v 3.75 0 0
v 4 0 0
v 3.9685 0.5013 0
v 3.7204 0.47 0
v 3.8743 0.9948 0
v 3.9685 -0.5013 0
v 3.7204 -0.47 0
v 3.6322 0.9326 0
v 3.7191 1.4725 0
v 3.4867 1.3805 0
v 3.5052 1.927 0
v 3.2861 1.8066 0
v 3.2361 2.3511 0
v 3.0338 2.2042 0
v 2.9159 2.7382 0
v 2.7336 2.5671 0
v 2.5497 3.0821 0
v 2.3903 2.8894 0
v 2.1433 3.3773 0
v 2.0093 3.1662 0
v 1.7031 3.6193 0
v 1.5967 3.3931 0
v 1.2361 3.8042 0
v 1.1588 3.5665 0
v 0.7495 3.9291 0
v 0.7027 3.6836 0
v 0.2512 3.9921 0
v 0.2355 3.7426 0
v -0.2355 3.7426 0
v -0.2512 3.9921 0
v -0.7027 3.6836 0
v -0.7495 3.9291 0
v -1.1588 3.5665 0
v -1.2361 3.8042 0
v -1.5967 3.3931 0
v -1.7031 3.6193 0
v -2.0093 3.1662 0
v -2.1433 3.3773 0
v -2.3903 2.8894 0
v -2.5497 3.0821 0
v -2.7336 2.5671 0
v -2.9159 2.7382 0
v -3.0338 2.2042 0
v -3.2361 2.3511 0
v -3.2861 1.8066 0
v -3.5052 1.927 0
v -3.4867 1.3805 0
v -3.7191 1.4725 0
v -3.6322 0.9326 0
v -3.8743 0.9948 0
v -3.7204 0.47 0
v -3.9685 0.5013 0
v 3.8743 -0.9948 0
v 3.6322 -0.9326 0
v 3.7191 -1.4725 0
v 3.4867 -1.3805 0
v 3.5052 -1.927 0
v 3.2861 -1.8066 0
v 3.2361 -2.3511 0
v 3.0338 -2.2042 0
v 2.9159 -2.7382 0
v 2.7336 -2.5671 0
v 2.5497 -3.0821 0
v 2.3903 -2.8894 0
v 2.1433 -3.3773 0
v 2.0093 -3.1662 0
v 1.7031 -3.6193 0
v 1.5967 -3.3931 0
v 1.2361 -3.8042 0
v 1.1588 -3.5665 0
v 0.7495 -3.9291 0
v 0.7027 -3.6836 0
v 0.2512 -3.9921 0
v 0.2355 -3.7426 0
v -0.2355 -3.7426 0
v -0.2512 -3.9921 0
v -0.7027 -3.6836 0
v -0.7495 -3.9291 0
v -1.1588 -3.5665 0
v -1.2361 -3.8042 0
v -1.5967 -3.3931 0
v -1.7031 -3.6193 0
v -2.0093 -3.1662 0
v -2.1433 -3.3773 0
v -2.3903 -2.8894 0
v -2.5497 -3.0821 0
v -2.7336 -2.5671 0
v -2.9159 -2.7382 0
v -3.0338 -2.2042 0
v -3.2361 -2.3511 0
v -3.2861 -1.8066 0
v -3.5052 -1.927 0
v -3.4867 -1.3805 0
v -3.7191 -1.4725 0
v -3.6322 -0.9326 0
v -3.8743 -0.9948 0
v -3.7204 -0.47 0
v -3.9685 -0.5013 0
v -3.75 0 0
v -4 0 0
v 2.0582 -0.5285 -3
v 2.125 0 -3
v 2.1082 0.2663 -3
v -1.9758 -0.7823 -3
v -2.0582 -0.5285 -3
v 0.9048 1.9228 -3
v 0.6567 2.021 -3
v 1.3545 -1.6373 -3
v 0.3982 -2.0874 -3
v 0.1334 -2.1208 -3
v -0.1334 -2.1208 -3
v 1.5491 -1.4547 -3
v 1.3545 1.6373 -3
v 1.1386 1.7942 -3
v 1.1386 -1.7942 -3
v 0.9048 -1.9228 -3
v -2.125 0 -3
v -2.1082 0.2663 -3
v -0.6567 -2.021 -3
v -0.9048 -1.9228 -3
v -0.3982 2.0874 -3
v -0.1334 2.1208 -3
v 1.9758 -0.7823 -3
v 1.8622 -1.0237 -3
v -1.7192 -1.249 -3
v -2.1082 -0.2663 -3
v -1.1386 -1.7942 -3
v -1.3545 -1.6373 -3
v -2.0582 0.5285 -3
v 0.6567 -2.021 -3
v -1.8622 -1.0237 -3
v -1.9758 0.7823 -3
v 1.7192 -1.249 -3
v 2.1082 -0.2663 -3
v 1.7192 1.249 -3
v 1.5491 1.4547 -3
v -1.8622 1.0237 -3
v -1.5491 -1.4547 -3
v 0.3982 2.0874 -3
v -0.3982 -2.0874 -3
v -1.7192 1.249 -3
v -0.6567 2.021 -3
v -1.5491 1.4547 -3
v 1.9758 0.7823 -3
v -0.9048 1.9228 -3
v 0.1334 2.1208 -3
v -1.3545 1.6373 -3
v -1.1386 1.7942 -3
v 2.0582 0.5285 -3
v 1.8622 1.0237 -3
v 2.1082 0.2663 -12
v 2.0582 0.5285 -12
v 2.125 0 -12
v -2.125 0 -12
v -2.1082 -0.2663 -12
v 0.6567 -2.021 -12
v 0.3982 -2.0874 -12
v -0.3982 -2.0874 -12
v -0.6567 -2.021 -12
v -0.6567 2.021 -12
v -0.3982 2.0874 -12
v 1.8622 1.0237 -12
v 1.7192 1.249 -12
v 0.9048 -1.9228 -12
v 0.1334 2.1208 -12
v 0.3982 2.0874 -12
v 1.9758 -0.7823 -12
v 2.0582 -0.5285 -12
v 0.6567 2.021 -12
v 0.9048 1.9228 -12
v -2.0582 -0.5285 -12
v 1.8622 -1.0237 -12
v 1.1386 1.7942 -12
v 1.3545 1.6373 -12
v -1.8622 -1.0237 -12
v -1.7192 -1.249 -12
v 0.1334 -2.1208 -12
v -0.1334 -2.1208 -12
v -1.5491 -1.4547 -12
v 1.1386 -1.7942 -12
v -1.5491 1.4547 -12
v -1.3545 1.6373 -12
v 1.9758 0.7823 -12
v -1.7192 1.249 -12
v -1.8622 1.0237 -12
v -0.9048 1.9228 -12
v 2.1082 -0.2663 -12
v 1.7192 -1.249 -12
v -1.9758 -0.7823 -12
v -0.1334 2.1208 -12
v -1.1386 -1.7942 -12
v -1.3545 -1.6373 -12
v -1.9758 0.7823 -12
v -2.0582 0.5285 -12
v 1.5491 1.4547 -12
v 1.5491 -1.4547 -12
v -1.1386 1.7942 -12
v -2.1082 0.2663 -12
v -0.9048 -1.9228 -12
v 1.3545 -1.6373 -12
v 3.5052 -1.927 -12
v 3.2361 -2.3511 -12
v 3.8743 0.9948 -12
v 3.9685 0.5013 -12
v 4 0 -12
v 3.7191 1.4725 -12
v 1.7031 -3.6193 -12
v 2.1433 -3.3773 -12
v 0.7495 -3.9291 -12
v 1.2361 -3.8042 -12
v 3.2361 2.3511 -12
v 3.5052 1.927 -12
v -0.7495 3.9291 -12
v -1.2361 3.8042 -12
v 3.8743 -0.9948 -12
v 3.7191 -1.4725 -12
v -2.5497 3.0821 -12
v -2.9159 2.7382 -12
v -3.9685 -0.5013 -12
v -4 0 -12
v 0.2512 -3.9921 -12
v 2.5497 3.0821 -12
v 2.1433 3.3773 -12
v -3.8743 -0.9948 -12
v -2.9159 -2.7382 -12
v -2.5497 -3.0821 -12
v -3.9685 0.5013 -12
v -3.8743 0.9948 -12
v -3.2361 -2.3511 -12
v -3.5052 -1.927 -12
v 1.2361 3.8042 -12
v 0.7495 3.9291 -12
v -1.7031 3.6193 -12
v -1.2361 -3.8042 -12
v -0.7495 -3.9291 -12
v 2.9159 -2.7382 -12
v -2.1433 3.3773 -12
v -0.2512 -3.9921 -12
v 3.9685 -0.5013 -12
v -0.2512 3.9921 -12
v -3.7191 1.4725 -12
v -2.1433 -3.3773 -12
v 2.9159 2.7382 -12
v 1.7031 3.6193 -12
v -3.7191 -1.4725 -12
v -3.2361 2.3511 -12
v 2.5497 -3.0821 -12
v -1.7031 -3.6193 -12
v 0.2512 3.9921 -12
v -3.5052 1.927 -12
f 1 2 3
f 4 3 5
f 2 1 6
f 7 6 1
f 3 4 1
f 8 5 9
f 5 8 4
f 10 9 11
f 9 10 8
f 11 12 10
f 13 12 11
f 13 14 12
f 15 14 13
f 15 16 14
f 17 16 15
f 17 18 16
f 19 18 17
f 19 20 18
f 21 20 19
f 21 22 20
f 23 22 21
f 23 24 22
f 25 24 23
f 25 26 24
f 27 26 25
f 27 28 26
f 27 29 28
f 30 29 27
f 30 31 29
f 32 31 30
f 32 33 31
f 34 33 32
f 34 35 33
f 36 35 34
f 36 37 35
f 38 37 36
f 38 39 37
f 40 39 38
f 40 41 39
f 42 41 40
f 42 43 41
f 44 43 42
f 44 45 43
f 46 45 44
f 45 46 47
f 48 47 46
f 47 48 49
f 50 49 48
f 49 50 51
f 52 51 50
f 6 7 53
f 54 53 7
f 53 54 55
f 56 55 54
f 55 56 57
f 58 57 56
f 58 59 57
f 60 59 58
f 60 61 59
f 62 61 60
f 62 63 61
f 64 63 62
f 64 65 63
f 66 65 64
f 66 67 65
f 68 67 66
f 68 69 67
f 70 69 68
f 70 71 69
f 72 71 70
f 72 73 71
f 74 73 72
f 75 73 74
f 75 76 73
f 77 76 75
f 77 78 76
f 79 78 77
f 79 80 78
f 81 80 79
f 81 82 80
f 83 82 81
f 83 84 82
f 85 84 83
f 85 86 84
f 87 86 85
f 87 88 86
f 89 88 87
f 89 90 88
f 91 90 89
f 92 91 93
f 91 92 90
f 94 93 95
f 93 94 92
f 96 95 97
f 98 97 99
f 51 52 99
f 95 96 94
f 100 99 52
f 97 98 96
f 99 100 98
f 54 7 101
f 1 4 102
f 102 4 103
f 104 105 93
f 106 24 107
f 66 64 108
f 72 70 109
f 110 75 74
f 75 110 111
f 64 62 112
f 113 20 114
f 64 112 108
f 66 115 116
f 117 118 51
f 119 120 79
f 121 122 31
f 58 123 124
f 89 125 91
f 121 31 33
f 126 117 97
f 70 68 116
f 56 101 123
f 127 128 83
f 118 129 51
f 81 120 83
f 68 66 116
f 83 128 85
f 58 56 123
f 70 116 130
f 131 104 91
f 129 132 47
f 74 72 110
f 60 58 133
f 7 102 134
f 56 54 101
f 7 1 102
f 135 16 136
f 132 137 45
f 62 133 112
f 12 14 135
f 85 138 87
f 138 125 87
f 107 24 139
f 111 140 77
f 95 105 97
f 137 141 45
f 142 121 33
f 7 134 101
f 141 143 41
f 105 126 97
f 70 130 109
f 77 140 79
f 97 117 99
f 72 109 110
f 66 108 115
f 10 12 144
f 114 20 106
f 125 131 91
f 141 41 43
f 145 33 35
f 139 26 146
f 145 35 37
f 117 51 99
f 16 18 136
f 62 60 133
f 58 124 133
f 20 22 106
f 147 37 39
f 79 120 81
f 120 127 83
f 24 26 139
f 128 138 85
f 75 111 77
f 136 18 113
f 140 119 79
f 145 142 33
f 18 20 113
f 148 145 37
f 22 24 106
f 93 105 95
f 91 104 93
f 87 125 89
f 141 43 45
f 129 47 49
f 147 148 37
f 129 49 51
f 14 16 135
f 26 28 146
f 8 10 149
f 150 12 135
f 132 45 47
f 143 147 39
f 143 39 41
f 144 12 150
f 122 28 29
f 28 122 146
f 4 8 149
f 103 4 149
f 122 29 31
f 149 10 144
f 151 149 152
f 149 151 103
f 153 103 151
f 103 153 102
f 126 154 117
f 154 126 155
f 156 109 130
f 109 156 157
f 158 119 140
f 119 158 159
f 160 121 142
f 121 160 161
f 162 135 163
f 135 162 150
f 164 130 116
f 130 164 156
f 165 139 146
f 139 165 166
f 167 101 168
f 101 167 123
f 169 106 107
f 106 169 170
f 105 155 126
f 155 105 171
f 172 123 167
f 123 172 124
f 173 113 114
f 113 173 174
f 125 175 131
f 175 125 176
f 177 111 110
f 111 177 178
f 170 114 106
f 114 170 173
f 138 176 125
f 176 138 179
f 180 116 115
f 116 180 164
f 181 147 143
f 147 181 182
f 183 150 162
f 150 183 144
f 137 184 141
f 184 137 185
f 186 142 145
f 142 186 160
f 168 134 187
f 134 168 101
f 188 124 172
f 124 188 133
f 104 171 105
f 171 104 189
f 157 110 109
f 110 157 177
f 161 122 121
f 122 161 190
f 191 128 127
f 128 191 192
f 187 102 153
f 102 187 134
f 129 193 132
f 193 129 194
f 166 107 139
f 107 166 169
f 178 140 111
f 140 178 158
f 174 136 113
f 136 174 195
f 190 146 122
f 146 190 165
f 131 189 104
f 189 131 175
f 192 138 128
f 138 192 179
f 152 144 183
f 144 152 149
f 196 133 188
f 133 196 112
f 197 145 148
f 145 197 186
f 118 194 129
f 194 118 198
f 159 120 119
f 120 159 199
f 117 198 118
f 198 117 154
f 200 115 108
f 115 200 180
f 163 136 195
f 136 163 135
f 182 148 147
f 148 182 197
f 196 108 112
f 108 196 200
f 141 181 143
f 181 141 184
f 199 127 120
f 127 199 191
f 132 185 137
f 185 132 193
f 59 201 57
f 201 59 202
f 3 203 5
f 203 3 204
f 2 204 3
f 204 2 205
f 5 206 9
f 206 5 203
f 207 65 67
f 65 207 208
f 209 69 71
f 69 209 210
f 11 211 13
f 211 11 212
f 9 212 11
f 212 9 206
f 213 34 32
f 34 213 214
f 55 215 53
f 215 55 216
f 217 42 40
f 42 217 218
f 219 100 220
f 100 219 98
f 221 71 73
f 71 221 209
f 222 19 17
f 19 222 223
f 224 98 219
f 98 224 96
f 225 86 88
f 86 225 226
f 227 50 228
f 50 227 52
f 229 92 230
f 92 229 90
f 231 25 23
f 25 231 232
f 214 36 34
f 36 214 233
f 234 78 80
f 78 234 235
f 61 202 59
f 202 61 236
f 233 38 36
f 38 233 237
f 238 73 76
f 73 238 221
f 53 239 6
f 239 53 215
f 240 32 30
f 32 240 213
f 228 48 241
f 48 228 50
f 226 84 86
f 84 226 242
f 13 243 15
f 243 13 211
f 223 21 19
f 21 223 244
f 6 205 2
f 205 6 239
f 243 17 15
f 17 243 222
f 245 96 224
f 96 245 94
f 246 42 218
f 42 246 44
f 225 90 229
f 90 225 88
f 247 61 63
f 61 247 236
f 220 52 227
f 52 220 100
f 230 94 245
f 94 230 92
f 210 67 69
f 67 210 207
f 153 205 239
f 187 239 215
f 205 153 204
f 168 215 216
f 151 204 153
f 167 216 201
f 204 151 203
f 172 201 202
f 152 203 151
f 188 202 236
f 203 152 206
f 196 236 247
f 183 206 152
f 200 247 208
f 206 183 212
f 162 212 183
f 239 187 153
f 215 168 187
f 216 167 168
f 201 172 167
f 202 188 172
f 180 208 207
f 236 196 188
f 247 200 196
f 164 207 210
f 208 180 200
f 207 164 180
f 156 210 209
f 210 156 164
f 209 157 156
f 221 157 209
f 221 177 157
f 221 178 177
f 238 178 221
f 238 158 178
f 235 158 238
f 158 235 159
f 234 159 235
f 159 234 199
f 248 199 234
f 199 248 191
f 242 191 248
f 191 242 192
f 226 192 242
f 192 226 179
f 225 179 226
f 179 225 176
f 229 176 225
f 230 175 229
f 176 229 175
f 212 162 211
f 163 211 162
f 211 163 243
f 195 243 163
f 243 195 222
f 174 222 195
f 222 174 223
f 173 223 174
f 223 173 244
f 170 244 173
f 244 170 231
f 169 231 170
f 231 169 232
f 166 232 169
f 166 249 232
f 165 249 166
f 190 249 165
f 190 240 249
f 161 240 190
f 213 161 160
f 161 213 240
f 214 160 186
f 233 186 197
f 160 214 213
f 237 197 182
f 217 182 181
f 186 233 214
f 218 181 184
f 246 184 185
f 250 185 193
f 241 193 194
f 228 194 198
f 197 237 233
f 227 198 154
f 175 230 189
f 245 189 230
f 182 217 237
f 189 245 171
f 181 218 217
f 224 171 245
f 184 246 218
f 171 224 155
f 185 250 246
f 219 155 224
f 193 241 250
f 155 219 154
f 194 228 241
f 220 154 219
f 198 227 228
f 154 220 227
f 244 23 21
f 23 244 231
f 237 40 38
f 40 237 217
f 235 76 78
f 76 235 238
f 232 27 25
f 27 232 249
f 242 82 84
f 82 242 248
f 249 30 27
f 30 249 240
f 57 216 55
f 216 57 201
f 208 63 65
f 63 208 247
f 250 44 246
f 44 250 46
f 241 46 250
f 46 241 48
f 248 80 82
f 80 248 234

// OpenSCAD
$fn = 50;

difference() {
	union() {
		translate(v = [0, 0, -12.0]) {
			cylinder(h = 12, r = 4.0);
		}
	}
	union() {
		translate(v = [0, 0, 0]) {
			rotate(a = [0, 0, 0]) {
				difference() {
					union() {
						translate(v = [0, 0, -15.0]) {
							cylinder(h = 15, r = 2.0);
						}
						translate(v = [0, 0, -3]) {
							cylinder(h = 3, r1 = 2.125, r2 = 3.75);
						}
						translate(v = [0, 0, -15.0]) {
							cylinder(h = 15, r = 2.125);
						}
						translate(v = [0, 0, -15.0]) {
							cylinder(h = 15, r = 2.0);
						}
					}
					union();
				}
			}
		}
	}
}
